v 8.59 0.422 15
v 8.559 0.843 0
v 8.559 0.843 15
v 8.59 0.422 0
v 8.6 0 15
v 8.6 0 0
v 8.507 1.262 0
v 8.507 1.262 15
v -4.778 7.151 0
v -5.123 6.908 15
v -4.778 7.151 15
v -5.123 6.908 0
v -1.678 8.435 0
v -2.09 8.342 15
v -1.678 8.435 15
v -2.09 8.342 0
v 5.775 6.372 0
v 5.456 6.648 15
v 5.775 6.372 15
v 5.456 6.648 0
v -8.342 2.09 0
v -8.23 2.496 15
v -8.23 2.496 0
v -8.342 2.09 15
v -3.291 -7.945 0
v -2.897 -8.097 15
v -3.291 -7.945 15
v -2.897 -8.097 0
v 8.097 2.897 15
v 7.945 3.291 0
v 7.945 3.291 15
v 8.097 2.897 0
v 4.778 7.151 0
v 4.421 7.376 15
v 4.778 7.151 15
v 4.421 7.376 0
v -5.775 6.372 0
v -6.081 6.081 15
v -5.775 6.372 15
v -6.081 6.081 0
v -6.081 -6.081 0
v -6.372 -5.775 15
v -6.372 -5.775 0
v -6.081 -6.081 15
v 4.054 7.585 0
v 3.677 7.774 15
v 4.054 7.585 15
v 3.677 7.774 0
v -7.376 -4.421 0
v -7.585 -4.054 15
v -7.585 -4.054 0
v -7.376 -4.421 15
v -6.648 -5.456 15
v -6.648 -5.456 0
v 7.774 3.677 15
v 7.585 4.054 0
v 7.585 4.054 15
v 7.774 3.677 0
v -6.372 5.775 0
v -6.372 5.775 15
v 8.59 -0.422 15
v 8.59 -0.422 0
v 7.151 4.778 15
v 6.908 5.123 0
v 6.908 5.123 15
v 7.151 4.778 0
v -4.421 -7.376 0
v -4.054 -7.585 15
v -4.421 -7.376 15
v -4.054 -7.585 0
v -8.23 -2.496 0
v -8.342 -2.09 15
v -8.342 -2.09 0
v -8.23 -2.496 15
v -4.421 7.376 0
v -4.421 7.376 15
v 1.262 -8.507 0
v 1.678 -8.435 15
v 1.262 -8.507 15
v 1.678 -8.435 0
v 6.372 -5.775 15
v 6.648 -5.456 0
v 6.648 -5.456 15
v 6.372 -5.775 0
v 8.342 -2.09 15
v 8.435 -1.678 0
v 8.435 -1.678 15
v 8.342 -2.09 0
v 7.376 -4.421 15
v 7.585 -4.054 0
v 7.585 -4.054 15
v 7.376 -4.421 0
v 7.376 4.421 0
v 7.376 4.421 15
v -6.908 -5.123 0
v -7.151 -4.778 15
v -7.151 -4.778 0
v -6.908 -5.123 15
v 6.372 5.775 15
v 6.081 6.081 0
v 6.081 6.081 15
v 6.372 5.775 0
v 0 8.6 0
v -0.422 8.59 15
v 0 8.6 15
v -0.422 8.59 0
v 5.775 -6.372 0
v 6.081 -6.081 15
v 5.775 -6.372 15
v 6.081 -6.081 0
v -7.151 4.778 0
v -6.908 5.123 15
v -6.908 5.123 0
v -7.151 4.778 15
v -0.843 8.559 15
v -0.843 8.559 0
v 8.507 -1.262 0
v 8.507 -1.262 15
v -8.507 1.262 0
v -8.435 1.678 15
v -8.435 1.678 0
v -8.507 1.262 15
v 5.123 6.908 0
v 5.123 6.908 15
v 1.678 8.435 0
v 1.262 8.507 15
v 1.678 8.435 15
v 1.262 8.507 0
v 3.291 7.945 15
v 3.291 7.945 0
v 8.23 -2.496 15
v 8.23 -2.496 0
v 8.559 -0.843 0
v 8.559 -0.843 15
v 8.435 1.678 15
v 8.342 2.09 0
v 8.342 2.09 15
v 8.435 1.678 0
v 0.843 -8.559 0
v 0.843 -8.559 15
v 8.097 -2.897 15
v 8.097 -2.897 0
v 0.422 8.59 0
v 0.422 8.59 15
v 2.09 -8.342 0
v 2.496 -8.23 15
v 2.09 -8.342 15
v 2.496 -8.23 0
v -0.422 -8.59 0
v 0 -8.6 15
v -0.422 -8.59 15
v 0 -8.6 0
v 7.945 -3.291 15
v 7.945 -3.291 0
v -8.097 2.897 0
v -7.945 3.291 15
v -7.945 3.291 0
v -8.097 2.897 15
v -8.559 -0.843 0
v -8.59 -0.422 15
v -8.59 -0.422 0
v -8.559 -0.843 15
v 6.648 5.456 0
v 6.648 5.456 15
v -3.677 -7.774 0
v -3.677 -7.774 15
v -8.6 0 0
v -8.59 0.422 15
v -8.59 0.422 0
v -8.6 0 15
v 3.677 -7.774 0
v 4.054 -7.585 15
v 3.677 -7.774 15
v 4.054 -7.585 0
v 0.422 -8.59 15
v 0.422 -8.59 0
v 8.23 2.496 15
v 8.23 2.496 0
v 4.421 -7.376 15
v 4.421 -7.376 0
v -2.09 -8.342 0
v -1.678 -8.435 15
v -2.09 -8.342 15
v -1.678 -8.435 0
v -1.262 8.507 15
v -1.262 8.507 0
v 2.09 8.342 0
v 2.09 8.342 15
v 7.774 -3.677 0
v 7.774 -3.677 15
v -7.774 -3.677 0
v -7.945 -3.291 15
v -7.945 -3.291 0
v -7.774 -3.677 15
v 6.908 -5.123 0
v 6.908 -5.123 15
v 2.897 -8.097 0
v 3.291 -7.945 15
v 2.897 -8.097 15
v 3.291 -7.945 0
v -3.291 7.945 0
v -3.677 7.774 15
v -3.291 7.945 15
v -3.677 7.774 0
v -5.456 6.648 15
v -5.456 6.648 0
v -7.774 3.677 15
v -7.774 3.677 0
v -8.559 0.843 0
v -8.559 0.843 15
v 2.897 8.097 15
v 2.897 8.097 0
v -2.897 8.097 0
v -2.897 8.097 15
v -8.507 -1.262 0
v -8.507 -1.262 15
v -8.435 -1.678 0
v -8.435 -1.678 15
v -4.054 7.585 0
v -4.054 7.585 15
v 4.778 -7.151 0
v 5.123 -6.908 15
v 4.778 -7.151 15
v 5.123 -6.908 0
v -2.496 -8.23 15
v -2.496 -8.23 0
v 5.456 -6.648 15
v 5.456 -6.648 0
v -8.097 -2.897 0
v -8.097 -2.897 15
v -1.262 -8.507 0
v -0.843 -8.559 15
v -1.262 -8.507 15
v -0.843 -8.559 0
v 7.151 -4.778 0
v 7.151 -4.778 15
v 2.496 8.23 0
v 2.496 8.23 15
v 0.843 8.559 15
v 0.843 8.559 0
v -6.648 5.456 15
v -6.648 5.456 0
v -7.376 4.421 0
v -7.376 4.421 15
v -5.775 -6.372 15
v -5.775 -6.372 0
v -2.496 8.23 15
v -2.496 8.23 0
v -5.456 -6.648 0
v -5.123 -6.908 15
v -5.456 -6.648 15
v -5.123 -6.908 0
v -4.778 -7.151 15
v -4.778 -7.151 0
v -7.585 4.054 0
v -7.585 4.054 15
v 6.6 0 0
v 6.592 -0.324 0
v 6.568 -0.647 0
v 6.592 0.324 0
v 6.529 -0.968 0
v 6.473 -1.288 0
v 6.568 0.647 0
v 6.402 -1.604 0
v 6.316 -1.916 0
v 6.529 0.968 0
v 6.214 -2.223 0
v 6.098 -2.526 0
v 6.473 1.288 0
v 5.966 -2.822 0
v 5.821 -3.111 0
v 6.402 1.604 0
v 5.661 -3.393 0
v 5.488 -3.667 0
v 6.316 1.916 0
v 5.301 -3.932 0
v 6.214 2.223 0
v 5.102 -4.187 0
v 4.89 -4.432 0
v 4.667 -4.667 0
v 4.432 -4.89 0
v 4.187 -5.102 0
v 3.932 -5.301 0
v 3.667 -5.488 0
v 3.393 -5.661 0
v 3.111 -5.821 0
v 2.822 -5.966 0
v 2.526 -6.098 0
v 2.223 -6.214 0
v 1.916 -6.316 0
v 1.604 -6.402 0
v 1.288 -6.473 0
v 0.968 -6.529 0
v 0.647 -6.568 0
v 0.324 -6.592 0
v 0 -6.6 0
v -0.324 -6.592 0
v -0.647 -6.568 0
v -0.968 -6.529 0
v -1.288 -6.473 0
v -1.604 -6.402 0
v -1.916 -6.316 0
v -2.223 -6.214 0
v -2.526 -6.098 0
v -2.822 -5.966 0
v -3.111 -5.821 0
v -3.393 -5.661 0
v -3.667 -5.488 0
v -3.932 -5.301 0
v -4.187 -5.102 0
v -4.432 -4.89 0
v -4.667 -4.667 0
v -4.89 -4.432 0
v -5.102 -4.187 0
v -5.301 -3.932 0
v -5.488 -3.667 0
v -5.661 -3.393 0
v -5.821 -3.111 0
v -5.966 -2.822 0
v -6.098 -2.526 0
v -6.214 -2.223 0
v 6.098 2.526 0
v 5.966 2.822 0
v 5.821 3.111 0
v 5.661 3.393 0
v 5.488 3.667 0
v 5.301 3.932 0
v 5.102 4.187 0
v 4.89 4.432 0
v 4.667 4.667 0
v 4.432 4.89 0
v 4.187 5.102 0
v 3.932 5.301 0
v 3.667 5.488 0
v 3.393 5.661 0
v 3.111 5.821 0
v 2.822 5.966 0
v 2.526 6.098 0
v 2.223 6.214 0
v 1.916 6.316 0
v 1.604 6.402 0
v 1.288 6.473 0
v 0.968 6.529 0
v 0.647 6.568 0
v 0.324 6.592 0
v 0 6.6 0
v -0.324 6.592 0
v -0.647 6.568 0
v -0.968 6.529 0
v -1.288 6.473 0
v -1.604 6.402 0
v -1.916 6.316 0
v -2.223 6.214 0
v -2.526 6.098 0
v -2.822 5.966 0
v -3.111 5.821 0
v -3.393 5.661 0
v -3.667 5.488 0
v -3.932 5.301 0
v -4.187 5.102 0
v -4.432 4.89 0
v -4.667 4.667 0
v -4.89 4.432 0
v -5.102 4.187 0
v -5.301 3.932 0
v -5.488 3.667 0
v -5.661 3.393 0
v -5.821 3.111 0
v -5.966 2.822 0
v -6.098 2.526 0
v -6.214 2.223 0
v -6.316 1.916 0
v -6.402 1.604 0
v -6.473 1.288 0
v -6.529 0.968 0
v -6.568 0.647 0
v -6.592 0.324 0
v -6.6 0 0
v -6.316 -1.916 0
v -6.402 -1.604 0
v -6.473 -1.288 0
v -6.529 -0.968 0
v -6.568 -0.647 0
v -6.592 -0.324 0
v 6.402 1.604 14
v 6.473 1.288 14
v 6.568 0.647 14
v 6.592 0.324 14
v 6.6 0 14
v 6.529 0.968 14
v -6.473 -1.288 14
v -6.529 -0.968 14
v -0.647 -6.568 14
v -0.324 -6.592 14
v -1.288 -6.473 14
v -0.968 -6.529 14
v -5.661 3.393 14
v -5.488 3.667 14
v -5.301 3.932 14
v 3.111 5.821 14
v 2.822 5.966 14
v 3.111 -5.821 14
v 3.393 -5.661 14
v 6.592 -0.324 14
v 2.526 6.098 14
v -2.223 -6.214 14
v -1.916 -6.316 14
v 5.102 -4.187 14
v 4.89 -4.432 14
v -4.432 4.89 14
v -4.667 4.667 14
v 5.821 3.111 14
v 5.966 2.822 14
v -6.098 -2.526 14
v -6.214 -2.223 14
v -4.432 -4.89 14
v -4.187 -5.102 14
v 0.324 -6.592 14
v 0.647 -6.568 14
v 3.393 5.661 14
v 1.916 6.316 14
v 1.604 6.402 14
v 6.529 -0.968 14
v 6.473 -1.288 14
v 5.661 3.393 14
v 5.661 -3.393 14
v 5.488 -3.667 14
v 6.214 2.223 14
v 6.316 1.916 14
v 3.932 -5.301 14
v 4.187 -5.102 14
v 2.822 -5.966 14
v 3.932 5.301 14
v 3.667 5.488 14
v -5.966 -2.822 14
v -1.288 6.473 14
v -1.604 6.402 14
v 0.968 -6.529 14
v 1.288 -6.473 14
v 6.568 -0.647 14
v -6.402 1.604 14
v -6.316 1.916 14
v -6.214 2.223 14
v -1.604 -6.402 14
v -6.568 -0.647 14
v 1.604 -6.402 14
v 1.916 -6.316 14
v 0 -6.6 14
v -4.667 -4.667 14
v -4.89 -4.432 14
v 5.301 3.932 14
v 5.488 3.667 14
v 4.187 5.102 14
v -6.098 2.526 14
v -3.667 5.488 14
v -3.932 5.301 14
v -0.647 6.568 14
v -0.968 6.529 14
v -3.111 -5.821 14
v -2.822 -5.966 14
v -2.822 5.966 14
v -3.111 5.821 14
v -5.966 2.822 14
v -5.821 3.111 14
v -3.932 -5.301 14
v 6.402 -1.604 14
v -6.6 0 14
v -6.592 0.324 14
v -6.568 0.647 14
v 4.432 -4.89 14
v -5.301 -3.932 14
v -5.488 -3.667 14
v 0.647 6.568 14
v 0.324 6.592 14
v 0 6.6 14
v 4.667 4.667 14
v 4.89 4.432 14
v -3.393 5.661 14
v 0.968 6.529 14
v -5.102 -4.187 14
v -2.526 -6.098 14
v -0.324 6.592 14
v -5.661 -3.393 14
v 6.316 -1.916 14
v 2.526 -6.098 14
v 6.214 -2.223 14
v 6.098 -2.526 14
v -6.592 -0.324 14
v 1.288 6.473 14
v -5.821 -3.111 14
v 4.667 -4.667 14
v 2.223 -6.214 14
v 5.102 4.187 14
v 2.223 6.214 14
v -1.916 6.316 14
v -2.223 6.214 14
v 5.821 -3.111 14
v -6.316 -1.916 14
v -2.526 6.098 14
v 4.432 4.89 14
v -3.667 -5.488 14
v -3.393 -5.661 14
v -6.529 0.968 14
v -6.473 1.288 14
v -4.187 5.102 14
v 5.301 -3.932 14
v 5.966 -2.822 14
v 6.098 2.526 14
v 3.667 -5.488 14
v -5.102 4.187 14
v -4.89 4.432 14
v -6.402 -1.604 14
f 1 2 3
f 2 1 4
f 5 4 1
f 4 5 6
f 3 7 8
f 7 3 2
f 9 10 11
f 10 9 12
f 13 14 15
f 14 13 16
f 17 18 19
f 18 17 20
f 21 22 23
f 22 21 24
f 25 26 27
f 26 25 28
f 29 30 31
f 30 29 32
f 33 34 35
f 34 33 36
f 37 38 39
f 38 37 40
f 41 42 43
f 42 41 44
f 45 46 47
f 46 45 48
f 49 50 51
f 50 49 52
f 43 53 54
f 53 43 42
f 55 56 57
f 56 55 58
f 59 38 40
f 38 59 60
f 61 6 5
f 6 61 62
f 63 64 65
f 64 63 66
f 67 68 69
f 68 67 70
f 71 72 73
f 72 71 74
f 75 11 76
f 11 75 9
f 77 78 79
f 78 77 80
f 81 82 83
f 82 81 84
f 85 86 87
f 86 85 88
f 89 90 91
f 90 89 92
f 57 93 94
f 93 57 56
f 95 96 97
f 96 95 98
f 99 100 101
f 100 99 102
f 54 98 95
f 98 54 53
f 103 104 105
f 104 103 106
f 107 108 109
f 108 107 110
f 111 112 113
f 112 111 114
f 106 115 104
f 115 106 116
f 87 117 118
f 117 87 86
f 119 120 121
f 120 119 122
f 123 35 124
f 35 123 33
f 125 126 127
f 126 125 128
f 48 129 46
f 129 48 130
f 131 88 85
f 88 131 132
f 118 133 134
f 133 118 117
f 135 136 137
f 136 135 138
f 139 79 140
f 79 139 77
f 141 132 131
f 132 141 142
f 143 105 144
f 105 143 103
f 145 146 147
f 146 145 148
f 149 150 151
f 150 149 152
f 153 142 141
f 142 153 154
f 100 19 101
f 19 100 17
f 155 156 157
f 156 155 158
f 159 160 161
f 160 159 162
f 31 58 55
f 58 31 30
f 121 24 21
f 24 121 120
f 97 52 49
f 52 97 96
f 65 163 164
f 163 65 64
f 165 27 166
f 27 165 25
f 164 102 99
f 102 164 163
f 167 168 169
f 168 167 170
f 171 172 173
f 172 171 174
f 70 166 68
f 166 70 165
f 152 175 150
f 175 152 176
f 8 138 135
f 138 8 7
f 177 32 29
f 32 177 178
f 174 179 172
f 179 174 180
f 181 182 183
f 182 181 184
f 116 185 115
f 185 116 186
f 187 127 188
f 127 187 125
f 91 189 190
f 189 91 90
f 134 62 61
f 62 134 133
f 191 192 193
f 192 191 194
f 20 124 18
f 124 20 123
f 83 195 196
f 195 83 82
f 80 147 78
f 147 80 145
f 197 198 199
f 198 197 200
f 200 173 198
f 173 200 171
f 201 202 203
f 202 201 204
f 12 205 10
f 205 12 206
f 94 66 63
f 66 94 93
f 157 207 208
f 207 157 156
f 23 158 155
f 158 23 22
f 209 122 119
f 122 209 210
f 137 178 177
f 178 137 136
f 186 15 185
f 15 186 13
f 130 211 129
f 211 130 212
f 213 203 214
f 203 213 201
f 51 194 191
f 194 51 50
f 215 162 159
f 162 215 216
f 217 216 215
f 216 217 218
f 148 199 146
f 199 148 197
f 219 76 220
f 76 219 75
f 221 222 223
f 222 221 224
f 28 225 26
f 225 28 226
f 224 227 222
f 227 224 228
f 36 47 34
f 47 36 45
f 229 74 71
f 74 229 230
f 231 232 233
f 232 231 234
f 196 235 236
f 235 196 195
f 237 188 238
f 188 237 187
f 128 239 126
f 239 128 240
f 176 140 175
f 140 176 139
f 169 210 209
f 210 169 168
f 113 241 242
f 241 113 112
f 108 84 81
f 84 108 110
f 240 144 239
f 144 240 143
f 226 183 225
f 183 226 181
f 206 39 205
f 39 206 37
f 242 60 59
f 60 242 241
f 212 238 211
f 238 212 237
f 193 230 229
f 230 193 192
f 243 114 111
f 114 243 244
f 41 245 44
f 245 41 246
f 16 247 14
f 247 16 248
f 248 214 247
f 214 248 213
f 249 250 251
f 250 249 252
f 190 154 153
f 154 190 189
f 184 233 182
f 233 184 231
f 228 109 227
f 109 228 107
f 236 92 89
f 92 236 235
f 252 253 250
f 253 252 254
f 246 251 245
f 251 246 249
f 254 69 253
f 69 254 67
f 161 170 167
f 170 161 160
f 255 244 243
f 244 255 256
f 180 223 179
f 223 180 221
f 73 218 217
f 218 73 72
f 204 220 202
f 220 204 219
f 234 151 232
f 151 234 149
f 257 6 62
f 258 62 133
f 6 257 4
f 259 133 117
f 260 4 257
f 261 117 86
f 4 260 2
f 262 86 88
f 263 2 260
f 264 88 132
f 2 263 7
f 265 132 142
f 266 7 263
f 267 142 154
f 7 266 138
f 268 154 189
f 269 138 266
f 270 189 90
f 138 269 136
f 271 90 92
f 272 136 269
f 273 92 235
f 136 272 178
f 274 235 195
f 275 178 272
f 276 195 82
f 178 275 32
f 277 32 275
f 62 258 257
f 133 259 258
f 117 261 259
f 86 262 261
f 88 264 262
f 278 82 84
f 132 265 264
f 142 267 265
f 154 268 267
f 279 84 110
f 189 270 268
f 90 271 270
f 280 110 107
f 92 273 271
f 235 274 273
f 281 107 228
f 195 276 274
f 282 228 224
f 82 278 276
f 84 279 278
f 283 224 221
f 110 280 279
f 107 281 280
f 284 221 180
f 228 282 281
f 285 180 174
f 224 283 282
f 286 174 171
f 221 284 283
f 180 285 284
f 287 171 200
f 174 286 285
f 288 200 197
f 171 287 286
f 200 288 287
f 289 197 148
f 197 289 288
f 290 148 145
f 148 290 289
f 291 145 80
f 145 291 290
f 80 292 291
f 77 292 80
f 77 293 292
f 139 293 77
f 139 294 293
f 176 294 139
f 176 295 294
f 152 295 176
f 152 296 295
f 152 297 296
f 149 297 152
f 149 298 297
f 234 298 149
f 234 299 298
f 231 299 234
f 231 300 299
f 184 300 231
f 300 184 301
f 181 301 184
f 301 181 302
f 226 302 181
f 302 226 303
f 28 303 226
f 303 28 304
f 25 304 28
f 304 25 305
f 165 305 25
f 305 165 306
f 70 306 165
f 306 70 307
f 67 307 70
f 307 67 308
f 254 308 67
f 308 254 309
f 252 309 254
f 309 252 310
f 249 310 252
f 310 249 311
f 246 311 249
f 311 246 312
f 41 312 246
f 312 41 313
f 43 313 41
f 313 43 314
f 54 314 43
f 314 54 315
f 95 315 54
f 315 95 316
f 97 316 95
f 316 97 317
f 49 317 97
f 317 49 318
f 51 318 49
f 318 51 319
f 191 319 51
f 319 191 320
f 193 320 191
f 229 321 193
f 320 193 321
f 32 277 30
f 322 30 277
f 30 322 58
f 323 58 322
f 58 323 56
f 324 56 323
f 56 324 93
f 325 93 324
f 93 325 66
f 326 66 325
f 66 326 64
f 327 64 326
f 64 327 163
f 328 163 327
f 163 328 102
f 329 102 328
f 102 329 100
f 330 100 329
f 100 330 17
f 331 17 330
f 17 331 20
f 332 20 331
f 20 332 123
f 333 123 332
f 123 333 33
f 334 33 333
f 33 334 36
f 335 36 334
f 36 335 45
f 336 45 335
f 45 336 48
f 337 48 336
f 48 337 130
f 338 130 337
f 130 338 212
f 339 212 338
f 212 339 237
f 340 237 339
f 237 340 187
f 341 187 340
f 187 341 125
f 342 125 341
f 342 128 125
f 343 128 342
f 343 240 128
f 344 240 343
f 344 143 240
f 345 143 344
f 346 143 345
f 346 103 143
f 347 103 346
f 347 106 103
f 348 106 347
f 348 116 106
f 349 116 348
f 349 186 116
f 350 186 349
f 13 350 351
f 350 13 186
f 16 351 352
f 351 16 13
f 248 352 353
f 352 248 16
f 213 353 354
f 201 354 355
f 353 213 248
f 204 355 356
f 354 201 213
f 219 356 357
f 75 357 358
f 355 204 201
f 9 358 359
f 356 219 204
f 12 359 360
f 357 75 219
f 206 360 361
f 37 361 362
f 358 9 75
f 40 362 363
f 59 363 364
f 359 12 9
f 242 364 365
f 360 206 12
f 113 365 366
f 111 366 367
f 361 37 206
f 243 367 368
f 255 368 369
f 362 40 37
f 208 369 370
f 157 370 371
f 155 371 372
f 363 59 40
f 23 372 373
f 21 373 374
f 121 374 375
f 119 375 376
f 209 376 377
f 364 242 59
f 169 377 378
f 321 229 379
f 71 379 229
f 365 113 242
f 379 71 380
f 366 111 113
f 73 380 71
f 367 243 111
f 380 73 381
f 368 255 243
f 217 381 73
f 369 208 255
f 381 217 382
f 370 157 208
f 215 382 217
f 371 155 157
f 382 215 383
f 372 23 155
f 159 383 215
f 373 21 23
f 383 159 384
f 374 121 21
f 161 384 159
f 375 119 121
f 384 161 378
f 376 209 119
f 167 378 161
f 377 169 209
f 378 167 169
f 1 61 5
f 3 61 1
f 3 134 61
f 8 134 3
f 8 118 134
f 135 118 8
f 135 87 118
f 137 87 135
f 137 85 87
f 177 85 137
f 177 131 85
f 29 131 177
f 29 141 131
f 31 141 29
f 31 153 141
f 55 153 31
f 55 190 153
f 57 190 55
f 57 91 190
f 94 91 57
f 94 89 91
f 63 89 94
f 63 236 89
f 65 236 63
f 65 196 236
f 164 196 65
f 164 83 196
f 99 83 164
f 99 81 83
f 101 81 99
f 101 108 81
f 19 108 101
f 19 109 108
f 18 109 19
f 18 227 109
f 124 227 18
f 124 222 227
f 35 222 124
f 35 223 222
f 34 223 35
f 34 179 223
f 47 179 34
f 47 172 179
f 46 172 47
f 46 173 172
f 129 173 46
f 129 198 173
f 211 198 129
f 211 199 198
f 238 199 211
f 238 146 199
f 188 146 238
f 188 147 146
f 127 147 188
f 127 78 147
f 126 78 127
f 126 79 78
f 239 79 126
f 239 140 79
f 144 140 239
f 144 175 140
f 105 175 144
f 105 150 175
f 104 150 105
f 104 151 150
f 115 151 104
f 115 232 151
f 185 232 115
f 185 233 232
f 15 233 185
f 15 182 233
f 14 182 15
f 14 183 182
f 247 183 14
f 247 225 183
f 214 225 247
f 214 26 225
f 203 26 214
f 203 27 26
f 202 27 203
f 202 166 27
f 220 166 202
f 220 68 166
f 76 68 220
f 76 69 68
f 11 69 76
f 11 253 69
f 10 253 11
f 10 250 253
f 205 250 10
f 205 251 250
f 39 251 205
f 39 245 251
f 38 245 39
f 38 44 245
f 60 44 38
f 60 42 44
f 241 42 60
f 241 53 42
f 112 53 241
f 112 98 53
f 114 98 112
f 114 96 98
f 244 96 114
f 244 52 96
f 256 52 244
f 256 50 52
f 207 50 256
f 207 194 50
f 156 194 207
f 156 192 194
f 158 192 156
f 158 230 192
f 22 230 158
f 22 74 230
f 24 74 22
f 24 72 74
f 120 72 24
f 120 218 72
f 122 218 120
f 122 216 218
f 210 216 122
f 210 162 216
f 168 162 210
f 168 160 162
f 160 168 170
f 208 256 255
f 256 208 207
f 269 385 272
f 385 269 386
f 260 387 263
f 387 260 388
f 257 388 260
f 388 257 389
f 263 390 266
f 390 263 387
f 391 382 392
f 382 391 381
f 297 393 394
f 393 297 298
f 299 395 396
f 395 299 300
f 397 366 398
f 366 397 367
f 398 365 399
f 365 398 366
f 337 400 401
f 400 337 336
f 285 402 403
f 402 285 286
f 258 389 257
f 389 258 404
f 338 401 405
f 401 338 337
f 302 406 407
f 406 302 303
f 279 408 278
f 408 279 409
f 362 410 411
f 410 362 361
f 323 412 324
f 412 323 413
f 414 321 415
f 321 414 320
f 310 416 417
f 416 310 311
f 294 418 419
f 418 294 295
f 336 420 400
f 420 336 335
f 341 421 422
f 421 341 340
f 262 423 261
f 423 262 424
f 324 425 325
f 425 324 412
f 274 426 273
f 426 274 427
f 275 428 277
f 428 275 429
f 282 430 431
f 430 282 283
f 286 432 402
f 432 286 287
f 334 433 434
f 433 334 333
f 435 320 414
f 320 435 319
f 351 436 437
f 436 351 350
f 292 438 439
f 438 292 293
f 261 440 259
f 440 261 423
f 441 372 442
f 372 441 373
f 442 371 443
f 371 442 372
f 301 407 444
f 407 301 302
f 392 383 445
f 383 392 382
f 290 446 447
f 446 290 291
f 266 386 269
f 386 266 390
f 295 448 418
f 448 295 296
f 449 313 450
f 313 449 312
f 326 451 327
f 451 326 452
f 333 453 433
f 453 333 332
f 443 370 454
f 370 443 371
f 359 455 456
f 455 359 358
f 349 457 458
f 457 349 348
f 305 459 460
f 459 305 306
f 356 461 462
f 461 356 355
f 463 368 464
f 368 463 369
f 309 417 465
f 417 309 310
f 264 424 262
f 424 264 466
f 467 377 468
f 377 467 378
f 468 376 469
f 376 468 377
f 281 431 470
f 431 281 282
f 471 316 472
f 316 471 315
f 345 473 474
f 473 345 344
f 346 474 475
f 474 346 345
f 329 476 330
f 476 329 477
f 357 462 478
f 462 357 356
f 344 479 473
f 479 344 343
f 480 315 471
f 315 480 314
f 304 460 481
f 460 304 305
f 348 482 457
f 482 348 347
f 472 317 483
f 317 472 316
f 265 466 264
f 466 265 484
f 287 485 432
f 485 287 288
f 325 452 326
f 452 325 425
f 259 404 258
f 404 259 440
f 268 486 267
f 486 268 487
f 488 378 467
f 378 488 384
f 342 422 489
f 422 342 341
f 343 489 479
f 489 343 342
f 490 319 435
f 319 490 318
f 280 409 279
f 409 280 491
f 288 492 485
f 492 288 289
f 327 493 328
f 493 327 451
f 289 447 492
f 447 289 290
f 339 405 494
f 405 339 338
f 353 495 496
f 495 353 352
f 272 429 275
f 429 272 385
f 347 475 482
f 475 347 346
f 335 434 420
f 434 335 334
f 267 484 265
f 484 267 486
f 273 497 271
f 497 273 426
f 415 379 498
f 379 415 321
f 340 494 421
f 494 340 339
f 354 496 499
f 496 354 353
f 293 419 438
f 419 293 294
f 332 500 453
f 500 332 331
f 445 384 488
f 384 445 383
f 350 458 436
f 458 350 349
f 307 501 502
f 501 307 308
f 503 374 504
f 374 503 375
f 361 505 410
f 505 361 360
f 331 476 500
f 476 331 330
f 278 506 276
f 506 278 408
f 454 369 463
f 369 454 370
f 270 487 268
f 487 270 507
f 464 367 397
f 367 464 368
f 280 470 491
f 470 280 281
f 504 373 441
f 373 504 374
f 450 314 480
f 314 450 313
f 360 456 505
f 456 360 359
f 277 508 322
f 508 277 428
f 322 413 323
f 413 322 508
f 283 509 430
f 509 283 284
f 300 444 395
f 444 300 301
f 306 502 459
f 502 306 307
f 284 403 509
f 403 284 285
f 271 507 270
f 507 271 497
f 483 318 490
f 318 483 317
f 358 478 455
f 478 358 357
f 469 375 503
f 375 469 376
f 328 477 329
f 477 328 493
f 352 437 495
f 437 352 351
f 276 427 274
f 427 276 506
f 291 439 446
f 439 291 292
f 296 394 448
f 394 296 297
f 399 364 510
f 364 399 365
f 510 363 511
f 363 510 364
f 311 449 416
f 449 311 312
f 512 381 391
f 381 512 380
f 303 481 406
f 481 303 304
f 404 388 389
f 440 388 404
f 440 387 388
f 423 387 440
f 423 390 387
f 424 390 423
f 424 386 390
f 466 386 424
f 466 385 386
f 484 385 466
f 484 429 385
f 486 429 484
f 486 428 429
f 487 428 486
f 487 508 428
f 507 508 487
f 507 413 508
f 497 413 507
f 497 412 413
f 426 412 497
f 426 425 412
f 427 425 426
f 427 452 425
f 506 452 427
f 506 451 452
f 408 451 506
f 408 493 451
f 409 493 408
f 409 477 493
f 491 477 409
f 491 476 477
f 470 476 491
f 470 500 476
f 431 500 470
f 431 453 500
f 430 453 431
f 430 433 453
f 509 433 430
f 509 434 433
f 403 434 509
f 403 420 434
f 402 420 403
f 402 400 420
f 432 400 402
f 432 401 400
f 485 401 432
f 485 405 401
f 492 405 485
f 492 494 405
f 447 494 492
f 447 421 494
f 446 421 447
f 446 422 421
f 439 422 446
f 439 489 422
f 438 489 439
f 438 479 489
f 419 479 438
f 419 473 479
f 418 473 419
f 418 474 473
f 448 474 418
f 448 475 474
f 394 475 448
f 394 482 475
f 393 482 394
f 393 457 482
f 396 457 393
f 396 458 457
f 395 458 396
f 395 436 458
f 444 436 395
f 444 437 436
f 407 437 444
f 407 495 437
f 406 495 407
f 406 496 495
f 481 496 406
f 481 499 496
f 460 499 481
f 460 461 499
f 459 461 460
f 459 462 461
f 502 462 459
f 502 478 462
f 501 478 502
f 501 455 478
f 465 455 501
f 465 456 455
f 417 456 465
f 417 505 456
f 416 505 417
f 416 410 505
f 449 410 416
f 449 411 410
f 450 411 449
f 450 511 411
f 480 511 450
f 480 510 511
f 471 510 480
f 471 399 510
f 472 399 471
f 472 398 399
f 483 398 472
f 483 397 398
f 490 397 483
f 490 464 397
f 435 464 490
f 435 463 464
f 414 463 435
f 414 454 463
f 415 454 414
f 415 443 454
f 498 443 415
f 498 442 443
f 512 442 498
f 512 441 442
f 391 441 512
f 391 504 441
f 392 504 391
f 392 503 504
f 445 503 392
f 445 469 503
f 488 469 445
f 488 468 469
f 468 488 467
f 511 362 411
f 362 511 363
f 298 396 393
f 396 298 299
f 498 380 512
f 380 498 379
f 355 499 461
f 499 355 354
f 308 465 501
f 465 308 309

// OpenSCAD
// file: magnet-hole.scad
magnetHole();

module main() {
  magnetHole();
}

module magnetHole() {
  $fn=128;
  r=7.525;
  d=3.5;
  
  t=d+1;
  difference() {
    cylinder(r=r+2,h=t);
    translate([0,0,-1]) cylinder(r=2,h=t+2);
    translate([0,0,-1]) cylinder(r=r,h=d+1);
  }
}
// main file
use <./magnet-hole.scad>;

$fn=128;
t=15;
l=200;
sr=6.6;
br=7.5;
w=(sr+1)*2+2;


// difference() {
//   cylinder(r=w/2,h=t);
//   translate([0,0,-1]) cylinder(r=sr+0.2,h=t+2);
// }


// difference() {

//   union() { 
//     bar(l-w*2,w,t);
//     magnetBar();
//     translate([l-w*2,0,0]) magnetBar();
//   }
//   translate([0,0,-1]) cylinder(r=sr+0.2,h=t+2);
//   translate([l-w*2,0,-1]) cylinder(r=sr+0.2,h=t+2);
//   translate([0,-20,t/2]) rotate([-90,0,0]) cylinder(r=2,h=100);
//   translate([l-w*2,-20,t/2]) rotate([-90,0,0]) cylinder(r=2,h=100);
// }



// magnetHole();
// difference() {
//   translate([-w/2,-t/2,0]) cube([w,t,4.5]);
//   translate([0,0,-1]) cylinder(r=9,h=6.5);
// }


// module magnetBar() {
//   rotate([0,0,90]) difference() {
//     bar(w/2+24.5,w,t,false);
//     translate([0,0,-1]) cylinder(r=sr,h=t+2);
//   }
// }

difference() {
    cylinder(r=w/2,h=t);
    translate([0,0,-1]) cylinder(r=sr,h=t);
}

// difference() {
//   bar(l,w,t);
//   translate([0,0,-1]) cylinder(r=sr,h=t);
//   translate([w,0,-1]) cylinder(r=br,h=t+2);

//   translate([l,0,-1]) cylinder(r=sr,h=t);
//   translate([l-w,0,-1]) cylinder(r=br,h=t+2);
// }

// translate([0,-20,0]) difference() {
//   bar(l,w,t);
//   translate([0,0,-1]) cylinder(r=sr,h=t);

//   translate([l,0,-1]) cylinder(r=sr,h=t);  
// }

// translate([0,20,0]) difference() {
//   bar(l,w,t);
//   translate([w,0,-1]) cylinder(r=sr,h=t);
//   translate([0,0,-1]) cylinder(r=br,h=t+2);

//   translate([l-w,0,-1]) cylinder(r=sr,h=t);
//   translate([l,0,-1]) cylinder(r=br,h=t+2);
// }

module bar(l,w,t,second_end=true) {
  cylinder(r=w/2,h=t);
  translate([0,-w/2,0]) cube([l,w,t]);
  if( second_end ) {
    translate([l,0,0]) cylinder(r=w/2,h=t);
  }
}
